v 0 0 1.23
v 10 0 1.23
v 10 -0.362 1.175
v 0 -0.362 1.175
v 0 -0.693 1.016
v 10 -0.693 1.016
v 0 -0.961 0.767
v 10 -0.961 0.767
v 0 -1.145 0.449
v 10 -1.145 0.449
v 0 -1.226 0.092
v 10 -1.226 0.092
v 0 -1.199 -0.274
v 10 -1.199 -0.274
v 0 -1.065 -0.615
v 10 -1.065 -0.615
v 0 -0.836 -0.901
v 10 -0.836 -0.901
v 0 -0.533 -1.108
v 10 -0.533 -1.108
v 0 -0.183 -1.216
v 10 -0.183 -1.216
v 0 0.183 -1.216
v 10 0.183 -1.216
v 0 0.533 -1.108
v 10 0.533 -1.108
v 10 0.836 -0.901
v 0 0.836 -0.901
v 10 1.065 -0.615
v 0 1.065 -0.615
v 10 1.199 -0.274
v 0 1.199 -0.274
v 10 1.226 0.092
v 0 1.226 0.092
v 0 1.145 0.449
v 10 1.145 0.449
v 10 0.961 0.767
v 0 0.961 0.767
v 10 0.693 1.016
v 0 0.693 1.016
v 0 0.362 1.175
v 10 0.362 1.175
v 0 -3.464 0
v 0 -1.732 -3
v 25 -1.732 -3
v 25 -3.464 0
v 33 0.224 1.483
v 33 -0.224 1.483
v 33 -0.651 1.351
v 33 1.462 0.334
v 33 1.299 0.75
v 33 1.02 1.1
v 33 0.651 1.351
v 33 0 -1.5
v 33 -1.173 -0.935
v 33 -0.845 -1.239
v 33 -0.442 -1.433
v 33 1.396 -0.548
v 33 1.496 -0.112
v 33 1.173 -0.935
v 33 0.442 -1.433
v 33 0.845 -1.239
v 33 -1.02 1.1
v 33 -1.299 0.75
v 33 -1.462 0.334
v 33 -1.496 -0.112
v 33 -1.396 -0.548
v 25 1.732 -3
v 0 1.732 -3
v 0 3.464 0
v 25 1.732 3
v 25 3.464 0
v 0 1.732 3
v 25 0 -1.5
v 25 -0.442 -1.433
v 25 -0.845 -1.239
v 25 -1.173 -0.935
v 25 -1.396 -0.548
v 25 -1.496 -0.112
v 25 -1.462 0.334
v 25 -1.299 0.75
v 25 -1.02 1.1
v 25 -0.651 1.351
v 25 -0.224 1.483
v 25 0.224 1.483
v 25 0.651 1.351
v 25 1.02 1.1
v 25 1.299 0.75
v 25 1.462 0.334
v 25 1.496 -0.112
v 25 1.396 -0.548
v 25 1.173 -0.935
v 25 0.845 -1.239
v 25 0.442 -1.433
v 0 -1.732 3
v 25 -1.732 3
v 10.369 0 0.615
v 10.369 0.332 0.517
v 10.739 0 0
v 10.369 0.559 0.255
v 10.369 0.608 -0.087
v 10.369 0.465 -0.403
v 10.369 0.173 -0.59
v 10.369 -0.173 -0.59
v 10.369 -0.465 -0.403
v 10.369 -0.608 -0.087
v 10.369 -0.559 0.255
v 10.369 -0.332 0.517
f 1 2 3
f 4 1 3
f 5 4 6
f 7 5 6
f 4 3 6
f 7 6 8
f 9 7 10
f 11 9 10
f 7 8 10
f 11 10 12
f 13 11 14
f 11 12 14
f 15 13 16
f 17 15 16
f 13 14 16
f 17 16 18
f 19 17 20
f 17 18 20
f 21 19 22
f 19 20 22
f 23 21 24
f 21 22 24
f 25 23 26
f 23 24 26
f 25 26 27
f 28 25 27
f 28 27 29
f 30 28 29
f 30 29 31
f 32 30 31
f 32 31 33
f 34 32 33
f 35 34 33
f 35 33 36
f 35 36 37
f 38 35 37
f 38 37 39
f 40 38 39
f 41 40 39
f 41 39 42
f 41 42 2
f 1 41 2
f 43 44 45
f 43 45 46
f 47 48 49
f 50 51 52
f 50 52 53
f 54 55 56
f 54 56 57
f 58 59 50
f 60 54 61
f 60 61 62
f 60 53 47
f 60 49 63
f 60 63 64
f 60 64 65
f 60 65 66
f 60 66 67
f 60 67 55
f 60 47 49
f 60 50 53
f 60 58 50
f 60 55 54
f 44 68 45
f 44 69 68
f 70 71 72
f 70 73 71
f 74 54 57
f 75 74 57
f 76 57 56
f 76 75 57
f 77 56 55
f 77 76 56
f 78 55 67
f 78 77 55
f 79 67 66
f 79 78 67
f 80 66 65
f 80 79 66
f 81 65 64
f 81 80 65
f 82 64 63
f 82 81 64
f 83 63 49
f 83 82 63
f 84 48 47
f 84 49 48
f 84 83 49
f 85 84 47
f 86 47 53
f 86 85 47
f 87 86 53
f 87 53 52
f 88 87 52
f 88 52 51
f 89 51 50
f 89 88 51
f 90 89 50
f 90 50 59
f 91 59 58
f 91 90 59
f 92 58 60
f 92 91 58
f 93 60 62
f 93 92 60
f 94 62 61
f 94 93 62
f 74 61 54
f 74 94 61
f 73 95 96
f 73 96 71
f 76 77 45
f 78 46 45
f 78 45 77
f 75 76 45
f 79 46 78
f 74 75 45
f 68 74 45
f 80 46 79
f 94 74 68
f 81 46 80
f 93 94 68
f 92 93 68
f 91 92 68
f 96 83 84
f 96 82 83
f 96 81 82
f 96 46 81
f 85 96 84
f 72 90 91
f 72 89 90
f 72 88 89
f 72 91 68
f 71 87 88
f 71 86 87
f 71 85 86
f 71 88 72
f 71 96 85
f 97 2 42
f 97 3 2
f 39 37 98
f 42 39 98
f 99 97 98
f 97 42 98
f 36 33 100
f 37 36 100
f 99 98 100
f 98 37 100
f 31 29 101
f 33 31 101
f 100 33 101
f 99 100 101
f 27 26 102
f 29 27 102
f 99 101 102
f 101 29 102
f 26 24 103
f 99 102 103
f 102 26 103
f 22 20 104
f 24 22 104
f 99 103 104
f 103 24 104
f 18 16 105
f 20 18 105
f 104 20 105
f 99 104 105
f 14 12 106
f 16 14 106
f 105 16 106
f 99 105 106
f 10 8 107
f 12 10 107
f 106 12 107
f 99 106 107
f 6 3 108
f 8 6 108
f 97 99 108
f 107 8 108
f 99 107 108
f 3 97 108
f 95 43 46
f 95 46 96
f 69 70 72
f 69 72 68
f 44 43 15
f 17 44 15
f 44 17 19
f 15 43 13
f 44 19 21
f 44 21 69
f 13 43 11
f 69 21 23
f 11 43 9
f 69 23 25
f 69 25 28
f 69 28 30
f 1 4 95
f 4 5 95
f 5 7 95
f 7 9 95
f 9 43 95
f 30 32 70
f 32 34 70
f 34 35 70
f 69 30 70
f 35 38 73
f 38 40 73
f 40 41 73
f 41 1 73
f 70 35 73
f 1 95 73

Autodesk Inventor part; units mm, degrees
ref_plane "YZ Plane" through (0, 0, 0) normal (1, 0, 0) x (0, 1, 0)
ref_plane "XZ Plane" through (0, 0, 0) normal (0, 1, 0) x (-1, 0, 0)
ref_plane "XY Plane" through (0, 0, 0) normal (0, 0, 1) x (1, 0, 0)
sketch "スケッチ1" plane through (0, 0, 0) normal (1, 0, 0) x (0, 1, 0)
  line L0 (1.7321, -3) -> (-1.7321, -3)
  line L1 (-1.7321, -3) -> (-3.4641, 0)
  line L2 (-3.4641, 0) -> (-1.7321, 3)
  line L3 (-1.7321, 3) -> (1.7321, 3)
  line L4 (1.7321, 3) -> (3.4641, 0)
  line L5 (3.4641, 0) -> (1.7321, -3)
  point P0 (0, 0)
  point P1 (0, 0)
  dimension "d0" = 6
extrude "押し出し1" add sketch "スケッチ1" along normal blind 25
sketch "スケッチ2" plane through (25, 0, 0) normal (1, 0, 0) x (0, 0, -1)
  circle A0 centre (0, 0) radius 1.5
  dimension "d3" = 3
extrude "押し出し2" add sketch "スケッチ2" along normal blind 8
thread "ねじ1" size "M3x0.5" class "6g" standard "ANSI Metric M Profile" full length
sketch "スケッチ3" plane through (0, 0, 0) normal (-1, 0, 0) x (0, 0, 1)
  point P0 (0, 0)
  point P1 (0, 0)
hole "穴1" at (0, 0, 0) direction (1, 0, 0) diameter 2.459 depth 10 tip angle 118 thread size "M3x0.5" class "6H" standard "ISO Metric profile"
properties part number "Spacer_M3_L15" material "鋼、合金"
